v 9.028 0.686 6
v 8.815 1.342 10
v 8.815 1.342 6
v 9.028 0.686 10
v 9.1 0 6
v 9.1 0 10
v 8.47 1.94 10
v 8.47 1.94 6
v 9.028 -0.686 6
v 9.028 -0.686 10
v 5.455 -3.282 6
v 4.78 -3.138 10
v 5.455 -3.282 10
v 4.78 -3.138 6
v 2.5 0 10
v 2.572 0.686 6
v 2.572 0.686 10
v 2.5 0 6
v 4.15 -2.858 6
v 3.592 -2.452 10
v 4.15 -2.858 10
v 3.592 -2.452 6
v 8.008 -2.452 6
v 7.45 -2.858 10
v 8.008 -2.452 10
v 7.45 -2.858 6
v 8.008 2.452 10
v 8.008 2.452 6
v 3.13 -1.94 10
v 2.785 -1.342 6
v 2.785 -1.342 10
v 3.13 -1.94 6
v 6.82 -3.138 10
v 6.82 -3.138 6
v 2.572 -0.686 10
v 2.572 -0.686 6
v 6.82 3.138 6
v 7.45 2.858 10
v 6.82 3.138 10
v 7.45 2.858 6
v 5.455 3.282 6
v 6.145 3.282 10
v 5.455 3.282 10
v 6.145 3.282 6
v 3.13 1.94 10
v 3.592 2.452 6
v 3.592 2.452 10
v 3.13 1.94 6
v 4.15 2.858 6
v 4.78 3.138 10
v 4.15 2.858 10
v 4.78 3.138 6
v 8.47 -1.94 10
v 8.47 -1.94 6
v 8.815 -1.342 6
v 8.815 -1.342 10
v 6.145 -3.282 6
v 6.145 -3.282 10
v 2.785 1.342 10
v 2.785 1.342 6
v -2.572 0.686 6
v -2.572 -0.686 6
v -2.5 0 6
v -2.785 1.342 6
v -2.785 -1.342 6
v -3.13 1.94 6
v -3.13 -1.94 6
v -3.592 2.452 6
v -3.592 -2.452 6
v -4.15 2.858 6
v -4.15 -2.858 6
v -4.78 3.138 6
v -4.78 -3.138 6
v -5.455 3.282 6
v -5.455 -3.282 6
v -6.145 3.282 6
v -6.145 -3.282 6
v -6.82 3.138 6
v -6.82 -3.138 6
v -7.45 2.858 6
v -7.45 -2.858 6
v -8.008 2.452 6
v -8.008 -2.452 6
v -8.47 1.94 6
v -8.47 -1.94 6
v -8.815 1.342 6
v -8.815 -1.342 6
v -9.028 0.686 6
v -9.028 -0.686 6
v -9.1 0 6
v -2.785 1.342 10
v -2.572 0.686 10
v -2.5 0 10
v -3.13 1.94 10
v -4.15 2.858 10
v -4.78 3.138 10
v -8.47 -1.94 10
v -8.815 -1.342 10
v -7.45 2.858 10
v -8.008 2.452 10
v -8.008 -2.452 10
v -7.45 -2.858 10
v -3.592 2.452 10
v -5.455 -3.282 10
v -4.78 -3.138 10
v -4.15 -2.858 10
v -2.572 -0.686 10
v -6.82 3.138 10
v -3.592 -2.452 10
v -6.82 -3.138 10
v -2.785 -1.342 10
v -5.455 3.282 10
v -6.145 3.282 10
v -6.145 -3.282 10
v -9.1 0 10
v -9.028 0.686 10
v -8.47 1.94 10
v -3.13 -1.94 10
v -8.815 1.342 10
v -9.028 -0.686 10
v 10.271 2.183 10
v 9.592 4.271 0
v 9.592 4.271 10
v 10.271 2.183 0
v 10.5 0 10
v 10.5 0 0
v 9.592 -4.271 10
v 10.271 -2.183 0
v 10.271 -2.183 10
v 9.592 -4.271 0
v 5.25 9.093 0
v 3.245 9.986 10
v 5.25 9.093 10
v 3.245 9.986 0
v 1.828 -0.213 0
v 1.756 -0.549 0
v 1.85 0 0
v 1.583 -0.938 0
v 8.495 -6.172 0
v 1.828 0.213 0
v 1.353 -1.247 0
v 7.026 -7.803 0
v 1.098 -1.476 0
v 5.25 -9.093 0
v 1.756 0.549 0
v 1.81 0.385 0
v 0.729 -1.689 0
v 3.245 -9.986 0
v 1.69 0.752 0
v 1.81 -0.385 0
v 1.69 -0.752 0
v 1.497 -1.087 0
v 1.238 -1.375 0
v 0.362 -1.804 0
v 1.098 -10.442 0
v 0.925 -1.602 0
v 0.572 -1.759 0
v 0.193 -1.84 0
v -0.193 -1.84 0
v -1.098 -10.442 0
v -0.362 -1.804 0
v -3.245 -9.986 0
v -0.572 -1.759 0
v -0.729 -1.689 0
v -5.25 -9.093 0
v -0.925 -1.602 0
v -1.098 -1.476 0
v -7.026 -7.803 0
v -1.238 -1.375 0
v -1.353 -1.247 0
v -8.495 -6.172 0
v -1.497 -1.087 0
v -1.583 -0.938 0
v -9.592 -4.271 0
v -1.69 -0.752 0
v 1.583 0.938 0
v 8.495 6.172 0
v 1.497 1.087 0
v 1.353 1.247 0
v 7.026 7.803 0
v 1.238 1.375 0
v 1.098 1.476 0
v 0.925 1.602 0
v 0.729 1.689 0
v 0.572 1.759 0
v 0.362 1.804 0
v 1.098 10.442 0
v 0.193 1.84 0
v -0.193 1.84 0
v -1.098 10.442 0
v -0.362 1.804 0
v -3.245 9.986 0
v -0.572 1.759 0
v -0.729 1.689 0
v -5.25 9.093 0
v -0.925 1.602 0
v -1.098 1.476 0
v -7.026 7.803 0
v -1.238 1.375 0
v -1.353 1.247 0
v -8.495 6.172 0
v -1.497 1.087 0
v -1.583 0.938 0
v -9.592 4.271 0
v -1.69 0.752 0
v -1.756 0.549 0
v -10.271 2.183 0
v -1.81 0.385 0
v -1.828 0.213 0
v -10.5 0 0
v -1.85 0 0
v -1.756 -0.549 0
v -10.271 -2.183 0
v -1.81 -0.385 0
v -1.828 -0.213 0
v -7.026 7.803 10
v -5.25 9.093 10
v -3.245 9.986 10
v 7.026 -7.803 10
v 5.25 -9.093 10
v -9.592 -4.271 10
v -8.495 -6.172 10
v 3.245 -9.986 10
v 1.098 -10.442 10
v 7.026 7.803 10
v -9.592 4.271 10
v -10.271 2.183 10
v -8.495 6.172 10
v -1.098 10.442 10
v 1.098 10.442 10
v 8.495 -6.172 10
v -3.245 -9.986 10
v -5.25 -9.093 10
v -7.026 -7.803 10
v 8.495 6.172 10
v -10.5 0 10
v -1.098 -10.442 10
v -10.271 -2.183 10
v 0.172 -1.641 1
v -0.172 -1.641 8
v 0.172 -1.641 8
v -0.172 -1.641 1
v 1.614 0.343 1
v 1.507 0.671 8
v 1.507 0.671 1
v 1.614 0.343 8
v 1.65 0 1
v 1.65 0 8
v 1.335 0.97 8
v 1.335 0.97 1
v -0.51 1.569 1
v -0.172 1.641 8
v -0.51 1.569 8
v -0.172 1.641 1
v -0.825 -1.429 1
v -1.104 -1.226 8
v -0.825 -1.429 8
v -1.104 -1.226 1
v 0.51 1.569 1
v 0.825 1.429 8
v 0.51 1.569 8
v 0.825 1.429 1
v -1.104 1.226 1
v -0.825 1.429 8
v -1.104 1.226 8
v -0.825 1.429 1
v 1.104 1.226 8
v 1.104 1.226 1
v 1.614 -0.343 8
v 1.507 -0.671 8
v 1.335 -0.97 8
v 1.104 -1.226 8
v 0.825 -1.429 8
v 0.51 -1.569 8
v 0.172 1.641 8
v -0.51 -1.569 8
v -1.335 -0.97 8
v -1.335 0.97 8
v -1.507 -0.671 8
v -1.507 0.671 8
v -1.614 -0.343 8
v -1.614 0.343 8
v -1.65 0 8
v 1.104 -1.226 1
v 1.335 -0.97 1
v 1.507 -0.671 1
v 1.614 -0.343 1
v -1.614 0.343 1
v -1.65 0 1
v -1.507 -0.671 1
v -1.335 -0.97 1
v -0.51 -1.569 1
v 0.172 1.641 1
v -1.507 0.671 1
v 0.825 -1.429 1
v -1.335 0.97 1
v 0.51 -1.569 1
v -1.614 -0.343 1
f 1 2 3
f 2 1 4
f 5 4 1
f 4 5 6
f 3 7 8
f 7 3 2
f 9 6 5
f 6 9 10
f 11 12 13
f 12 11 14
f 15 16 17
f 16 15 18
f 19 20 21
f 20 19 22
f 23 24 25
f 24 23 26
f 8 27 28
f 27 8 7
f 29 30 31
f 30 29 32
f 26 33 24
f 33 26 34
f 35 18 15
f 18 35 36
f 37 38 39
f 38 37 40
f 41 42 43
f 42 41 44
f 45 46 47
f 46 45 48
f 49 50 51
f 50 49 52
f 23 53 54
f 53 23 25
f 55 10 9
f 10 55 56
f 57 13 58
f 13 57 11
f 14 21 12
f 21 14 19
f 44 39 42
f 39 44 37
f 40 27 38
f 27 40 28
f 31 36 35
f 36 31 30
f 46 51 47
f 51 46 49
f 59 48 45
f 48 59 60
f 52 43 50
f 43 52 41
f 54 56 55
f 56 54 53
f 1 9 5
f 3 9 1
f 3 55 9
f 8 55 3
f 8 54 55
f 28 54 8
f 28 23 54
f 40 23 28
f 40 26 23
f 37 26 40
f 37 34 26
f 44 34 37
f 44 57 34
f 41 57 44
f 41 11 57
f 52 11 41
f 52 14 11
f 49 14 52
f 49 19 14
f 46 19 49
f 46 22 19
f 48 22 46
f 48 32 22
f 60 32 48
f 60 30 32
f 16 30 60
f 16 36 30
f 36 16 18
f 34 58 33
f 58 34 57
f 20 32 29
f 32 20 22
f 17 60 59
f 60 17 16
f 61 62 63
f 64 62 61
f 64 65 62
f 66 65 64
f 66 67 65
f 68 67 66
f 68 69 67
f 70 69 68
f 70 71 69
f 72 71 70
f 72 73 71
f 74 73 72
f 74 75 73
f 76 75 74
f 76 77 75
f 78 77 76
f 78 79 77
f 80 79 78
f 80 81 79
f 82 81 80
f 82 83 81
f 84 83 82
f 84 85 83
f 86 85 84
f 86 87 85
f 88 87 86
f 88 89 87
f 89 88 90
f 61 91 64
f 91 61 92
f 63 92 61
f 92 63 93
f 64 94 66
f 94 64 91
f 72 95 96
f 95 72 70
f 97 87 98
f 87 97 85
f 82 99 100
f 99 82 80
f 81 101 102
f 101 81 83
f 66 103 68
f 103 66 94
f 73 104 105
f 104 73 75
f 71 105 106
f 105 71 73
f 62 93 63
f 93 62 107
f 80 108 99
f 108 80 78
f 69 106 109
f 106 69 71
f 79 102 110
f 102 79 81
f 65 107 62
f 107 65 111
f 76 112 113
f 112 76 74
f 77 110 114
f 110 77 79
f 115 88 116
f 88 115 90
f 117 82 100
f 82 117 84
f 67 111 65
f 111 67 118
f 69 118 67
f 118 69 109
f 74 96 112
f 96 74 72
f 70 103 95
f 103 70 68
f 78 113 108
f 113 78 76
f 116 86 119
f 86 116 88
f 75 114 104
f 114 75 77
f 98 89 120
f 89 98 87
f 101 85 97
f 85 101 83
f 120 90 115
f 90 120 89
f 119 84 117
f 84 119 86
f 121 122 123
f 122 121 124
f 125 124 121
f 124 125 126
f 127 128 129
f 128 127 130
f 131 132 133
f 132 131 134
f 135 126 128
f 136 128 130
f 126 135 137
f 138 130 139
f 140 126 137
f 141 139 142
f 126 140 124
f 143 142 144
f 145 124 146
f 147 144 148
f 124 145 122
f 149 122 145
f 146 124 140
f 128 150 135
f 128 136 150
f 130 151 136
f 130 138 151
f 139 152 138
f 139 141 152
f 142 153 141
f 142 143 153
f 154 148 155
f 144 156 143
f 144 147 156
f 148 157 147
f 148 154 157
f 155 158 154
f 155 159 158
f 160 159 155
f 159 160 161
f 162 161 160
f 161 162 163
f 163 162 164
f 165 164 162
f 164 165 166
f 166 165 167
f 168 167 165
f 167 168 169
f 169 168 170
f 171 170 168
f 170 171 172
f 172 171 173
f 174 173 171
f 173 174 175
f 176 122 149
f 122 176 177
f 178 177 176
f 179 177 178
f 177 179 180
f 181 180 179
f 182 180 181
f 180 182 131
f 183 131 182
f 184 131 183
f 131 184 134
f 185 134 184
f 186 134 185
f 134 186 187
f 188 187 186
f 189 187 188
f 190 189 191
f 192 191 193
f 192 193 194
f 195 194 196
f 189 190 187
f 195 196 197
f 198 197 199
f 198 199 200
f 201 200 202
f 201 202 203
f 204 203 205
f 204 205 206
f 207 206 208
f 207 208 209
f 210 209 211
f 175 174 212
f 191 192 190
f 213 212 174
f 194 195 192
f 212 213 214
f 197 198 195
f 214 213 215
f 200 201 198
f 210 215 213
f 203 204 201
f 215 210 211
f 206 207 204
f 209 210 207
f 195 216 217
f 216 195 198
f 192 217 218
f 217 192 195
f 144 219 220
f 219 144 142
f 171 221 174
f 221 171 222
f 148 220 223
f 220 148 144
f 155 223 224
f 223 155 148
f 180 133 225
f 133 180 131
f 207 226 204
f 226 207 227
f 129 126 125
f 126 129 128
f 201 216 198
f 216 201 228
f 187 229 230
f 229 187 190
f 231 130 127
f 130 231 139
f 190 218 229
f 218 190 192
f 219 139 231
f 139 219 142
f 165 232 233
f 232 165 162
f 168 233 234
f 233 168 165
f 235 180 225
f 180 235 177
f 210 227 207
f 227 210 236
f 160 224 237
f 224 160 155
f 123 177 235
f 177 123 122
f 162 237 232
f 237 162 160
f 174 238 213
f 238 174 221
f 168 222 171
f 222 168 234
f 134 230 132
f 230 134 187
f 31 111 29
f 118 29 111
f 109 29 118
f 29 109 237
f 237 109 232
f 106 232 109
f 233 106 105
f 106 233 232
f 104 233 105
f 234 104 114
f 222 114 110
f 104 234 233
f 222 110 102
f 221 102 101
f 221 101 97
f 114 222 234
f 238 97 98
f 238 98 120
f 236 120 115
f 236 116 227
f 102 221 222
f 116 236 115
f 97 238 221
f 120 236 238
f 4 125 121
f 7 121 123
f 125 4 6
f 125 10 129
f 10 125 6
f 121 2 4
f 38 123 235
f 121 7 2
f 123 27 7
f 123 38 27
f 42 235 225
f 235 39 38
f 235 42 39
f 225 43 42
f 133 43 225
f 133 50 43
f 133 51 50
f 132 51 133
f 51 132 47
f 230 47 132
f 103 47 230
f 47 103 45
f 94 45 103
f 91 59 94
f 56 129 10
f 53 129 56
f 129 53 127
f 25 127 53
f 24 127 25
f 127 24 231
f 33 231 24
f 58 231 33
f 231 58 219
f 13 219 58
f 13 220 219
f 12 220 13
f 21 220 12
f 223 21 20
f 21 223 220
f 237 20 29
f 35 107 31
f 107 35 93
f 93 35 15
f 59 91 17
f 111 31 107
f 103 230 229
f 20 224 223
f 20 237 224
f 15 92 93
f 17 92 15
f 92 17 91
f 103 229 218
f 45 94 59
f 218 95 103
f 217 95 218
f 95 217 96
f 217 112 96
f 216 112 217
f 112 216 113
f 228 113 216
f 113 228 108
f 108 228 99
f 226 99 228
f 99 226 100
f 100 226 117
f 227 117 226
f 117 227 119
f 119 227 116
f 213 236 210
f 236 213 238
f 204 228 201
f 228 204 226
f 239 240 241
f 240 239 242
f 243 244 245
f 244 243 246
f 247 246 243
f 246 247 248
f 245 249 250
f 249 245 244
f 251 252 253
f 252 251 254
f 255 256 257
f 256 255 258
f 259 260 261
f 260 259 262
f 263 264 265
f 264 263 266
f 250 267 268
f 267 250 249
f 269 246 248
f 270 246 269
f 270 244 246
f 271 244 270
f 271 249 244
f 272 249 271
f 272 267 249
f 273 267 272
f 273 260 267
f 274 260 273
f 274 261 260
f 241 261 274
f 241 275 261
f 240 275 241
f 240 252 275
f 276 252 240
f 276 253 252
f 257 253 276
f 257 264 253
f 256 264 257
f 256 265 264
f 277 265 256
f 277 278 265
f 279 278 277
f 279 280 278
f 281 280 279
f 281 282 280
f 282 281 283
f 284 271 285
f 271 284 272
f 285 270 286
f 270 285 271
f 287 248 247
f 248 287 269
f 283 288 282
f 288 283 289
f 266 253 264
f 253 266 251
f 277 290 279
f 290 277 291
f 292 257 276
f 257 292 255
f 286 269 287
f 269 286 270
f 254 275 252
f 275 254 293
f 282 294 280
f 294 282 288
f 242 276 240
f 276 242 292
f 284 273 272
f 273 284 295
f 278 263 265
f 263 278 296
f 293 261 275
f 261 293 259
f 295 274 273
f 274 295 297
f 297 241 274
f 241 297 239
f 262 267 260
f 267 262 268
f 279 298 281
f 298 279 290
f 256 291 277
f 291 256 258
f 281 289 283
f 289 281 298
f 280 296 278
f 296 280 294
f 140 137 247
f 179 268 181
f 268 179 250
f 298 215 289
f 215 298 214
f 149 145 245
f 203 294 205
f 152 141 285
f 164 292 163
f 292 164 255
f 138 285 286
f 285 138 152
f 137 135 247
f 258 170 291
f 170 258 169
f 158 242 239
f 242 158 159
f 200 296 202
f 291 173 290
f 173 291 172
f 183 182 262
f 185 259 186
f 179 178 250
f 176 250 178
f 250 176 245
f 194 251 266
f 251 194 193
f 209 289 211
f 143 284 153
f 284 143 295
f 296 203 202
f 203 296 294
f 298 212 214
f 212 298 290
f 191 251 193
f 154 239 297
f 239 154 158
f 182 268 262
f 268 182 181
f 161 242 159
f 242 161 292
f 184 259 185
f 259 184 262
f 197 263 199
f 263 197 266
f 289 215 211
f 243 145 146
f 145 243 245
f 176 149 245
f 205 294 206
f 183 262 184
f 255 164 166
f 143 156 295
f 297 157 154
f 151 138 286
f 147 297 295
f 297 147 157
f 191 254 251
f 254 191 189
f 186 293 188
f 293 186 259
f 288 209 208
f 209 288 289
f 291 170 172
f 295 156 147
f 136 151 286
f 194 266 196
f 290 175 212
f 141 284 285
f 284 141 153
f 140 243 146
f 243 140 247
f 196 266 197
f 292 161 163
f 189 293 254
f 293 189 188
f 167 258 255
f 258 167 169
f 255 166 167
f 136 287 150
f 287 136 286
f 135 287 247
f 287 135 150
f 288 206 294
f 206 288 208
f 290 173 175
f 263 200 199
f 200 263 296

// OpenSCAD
diameter = 21;
//magnet_hole_dia = 6.4;
magnet_hole_dia = 6.6;
magnet_hole_depth = 4;
height = 10;
//shaft_dia = 3.05;
shaft_dia = 3.3;
shaft_depth = 8;
hole_offset = 5.8;


difference() {
  cylinder(h=height,d=diameter);
  for (i = [hole_offset,-hole_offset]) {
    translate([i,0,height]) 
      cylinder(h=magnet_hole_depth*2,d=magnet_hole_dia,center=true,$fn=30);
  }
  cylinder(h=2*shaft_depth, d=shaft_dia, center=true,$fn=30);
  #cylinder(h=2 ,d2=shaft_dia,d1=shaft_dia+0.8,,center=true,$fn=30);
}
